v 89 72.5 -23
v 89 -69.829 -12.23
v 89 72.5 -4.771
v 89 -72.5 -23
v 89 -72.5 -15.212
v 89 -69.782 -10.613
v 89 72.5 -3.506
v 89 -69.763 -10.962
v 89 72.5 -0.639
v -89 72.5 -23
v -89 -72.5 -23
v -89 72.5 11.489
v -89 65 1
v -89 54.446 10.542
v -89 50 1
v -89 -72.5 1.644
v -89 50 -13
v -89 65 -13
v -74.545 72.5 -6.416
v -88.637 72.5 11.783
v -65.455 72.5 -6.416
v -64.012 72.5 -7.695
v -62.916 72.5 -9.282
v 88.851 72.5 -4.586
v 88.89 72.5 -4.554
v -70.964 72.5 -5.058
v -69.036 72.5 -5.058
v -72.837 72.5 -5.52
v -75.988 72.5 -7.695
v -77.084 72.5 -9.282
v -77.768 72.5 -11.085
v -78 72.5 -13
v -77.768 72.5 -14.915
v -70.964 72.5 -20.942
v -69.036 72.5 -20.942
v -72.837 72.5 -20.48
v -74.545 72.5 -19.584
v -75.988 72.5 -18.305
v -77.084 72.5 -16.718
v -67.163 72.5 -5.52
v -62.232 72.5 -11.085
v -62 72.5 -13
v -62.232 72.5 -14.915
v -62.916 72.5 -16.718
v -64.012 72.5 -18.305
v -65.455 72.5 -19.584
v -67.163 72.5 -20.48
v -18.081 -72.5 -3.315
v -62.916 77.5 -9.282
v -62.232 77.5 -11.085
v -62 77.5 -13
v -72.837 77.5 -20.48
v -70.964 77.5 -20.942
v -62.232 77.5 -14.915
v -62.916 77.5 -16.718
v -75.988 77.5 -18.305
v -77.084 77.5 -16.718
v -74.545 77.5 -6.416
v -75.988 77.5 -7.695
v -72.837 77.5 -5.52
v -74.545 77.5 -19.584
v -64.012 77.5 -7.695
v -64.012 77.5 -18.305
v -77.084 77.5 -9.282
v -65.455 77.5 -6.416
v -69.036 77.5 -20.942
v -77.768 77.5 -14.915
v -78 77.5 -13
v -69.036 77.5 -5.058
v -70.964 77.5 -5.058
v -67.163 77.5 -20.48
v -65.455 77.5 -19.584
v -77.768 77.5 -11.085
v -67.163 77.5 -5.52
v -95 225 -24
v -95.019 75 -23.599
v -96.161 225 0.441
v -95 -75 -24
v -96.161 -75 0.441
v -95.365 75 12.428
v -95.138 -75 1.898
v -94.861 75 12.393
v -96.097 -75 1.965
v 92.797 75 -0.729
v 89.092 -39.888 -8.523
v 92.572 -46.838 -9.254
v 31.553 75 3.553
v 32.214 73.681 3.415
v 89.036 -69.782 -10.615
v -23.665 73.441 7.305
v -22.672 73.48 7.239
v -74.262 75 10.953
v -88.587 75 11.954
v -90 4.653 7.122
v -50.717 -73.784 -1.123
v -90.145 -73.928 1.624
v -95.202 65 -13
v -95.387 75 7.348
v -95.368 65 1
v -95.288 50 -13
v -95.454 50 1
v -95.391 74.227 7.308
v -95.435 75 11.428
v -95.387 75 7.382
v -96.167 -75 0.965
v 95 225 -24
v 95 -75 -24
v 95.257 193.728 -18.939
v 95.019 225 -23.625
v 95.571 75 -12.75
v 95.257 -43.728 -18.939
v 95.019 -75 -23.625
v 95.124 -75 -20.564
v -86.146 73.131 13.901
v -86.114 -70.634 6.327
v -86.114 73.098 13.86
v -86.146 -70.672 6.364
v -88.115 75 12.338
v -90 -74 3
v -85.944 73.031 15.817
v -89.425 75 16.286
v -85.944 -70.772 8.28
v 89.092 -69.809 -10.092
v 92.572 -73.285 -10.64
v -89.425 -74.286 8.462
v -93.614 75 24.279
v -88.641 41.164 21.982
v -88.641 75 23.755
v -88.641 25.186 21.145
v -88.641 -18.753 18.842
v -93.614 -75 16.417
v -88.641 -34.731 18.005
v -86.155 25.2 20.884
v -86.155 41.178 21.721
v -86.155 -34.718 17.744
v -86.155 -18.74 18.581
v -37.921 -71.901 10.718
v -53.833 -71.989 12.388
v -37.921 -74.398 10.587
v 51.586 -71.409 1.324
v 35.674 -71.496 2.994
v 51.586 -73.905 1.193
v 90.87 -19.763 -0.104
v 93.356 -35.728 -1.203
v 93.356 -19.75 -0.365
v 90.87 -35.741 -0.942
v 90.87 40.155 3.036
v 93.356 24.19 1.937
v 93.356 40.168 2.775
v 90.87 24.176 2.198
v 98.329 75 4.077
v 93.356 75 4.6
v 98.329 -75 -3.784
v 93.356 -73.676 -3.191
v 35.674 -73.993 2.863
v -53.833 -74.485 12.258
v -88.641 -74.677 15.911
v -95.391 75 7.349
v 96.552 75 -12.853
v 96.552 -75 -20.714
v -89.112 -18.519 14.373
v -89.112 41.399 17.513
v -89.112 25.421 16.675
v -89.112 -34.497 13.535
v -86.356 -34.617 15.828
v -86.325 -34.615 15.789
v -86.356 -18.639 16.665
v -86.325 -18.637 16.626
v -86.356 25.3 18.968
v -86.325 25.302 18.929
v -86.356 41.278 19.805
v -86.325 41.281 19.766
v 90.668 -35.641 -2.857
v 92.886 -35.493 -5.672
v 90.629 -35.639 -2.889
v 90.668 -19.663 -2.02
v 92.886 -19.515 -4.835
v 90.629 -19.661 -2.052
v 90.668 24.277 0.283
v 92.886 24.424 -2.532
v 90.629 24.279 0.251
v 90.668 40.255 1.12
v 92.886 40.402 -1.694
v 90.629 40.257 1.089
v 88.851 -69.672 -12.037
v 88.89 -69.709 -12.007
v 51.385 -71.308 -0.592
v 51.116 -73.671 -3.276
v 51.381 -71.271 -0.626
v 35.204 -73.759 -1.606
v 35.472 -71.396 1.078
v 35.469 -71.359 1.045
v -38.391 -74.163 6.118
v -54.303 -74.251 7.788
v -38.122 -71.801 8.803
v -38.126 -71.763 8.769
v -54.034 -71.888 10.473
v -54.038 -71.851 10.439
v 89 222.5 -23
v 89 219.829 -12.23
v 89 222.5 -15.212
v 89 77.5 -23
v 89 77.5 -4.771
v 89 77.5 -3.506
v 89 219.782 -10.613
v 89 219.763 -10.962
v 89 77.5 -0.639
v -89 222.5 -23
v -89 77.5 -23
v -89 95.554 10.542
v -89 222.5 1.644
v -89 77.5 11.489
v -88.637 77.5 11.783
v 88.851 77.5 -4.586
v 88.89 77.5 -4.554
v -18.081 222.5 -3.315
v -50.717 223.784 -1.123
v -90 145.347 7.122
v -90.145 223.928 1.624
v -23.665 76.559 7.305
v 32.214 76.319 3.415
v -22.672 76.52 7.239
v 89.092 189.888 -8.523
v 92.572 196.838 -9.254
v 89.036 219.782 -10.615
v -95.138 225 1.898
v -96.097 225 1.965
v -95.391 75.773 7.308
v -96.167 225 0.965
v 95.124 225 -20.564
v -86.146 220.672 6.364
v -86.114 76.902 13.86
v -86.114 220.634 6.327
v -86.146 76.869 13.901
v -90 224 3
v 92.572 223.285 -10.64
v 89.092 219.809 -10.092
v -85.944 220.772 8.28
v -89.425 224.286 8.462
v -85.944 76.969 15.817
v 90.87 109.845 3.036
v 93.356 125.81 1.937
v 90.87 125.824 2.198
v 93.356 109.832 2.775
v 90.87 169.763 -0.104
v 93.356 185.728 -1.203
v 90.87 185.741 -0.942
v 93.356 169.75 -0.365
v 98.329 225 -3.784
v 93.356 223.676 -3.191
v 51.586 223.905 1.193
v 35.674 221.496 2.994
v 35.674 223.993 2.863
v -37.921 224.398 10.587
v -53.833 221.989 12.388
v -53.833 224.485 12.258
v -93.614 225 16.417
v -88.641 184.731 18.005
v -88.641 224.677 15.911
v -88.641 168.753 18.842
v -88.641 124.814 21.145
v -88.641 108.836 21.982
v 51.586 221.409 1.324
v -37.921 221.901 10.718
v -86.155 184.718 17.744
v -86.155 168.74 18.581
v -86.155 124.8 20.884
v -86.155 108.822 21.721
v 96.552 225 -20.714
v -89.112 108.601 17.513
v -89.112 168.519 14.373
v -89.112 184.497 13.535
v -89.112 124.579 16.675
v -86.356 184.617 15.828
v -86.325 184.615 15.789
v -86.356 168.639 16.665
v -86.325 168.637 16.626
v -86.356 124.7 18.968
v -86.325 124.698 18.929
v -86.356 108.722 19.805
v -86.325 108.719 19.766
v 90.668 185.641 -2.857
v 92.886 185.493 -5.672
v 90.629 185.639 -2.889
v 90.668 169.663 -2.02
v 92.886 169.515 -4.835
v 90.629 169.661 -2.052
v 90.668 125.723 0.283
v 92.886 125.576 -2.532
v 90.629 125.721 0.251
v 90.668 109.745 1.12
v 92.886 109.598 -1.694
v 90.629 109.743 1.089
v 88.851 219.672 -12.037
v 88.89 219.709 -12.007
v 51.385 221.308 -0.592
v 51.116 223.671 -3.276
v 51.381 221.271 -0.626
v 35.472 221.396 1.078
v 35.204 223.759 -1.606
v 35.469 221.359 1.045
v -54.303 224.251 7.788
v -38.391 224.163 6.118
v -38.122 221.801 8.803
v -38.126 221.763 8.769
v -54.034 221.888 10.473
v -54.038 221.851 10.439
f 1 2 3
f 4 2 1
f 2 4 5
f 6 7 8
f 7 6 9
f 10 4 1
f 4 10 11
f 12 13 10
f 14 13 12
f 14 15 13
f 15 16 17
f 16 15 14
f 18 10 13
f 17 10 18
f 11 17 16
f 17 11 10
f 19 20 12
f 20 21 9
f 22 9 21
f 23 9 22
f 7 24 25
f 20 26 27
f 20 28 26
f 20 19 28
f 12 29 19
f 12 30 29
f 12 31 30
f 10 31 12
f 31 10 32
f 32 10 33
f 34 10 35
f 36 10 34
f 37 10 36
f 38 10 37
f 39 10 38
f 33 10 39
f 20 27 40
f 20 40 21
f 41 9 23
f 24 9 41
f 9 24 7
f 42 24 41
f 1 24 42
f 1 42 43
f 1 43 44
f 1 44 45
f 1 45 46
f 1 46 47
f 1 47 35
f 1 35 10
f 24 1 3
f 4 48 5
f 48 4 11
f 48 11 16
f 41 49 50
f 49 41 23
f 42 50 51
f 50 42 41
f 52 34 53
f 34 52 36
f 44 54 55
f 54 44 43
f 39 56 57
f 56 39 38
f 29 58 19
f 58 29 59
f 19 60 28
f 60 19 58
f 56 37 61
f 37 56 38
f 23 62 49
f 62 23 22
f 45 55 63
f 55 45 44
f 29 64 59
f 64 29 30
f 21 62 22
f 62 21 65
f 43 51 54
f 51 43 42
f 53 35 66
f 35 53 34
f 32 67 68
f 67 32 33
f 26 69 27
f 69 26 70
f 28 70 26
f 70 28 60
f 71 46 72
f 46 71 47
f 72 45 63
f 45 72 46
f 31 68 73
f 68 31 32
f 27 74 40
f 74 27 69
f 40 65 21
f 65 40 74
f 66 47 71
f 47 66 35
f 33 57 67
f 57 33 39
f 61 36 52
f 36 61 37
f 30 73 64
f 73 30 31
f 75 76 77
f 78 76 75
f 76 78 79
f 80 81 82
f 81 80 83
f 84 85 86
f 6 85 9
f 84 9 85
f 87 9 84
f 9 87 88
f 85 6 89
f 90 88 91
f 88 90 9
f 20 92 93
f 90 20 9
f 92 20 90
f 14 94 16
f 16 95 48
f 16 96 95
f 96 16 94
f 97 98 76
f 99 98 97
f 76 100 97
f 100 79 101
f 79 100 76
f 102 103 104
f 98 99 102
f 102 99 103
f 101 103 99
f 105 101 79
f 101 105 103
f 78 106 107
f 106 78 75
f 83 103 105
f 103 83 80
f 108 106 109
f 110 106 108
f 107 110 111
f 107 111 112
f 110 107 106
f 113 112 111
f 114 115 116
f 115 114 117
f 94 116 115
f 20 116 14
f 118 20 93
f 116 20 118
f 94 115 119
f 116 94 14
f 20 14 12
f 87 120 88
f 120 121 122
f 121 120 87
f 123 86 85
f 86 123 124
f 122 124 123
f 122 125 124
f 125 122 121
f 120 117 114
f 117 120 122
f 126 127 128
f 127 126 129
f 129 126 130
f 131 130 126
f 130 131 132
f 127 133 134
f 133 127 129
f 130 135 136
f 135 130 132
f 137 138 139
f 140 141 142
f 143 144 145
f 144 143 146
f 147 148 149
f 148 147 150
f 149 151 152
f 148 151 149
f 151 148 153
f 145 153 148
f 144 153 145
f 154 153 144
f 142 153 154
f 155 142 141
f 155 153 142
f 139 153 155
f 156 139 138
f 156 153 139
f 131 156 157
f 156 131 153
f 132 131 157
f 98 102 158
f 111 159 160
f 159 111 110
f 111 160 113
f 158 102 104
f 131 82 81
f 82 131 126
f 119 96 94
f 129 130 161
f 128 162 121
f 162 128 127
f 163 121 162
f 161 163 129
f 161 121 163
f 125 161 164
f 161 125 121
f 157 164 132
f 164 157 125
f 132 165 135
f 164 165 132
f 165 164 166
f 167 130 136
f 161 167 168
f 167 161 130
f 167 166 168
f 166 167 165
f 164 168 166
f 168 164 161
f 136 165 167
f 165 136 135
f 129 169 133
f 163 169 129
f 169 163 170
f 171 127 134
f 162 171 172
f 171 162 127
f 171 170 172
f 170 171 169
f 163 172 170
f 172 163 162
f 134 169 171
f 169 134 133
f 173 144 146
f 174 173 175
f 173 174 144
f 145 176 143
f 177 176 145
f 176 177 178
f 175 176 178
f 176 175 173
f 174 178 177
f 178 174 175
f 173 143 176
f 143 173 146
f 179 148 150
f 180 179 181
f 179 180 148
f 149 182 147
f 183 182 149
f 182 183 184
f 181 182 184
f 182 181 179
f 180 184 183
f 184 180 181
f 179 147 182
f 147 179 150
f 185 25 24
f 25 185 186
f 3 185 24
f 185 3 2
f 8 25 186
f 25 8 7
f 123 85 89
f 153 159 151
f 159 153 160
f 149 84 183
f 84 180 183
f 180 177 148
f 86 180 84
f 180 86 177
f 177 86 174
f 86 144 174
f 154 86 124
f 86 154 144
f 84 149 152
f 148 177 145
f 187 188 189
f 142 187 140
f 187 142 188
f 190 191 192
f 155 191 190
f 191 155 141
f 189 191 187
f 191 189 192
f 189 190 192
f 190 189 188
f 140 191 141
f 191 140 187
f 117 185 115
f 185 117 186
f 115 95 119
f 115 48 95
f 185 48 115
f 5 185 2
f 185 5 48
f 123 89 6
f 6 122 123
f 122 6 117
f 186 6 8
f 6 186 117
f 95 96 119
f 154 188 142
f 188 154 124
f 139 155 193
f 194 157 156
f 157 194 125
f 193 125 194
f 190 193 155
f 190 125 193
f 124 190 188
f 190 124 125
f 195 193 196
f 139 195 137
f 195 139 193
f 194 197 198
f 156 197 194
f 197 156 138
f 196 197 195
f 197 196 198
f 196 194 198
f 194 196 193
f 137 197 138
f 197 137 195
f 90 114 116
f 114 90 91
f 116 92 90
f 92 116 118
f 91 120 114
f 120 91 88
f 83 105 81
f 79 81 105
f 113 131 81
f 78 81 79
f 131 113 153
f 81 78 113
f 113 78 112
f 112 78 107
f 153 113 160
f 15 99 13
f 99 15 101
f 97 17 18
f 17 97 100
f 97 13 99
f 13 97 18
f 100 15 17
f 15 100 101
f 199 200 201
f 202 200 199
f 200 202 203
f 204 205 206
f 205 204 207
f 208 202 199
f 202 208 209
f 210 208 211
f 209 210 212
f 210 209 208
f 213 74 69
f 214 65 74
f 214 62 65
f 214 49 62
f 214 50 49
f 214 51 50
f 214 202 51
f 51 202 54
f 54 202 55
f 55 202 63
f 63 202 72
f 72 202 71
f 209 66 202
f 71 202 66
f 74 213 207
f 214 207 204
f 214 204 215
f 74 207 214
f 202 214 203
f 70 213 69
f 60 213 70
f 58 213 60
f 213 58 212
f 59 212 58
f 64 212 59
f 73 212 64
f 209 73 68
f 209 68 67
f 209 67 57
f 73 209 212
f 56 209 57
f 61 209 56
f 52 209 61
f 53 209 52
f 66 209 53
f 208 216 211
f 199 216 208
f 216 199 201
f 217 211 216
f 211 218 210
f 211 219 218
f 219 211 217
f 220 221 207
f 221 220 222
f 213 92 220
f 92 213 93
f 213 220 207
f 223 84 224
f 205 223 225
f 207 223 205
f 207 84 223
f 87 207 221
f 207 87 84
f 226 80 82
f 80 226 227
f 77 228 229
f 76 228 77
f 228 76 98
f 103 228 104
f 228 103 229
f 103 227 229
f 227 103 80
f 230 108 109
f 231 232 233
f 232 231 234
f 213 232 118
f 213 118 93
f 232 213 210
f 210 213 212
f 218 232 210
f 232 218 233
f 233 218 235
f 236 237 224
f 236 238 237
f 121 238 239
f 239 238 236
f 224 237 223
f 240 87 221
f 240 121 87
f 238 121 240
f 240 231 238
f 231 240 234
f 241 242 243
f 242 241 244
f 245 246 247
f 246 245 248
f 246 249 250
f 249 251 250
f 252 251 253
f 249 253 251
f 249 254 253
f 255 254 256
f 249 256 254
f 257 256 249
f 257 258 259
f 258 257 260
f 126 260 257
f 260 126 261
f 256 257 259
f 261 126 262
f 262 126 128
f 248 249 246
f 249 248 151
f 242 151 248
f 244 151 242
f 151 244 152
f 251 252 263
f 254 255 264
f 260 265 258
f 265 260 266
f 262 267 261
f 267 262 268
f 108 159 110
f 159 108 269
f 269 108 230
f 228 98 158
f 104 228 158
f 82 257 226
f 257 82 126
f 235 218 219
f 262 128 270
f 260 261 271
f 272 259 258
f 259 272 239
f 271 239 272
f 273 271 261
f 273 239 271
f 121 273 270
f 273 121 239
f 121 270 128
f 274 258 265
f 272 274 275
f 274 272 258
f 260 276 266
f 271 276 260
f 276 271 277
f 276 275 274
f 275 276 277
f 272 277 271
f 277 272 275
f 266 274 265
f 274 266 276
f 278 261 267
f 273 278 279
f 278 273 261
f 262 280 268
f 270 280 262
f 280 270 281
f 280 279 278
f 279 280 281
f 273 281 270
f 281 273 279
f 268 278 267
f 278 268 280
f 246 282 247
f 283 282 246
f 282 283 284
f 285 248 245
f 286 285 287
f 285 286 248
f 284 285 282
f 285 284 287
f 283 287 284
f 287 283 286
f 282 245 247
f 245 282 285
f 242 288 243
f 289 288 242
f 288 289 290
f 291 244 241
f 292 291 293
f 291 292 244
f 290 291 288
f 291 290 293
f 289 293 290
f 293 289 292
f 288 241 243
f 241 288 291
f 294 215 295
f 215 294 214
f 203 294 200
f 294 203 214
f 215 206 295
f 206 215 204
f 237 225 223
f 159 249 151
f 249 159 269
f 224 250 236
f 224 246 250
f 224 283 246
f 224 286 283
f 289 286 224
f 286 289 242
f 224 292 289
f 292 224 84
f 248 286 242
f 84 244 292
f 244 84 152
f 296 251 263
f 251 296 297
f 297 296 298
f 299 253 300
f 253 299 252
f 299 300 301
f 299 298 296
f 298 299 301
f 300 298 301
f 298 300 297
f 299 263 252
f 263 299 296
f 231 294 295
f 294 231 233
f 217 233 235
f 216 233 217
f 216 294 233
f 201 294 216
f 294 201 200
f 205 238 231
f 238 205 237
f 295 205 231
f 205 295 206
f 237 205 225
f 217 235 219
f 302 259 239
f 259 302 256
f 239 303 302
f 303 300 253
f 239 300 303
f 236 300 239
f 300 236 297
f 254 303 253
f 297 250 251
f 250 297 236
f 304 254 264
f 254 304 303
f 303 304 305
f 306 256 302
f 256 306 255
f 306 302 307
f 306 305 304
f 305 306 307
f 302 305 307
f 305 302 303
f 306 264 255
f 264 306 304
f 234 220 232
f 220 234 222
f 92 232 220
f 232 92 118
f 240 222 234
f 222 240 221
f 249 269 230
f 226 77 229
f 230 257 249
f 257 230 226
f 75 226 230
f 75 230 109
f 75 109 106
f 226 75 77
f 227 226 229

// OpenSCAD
// file: mark6-keyboard-hand-holder.scad
keyPlateHolder();

module keyPlateHolder() {
	bevelEdge(153);
	translate([40,1,0])	bevelClip();
	translate([100,1,0])	bevelClip();


	translate([-2,-183,0]) mirror([0,1,0]) {
		translate([40,1,0])	bevelClip();
		translate([100,1,0])	bevelClip();

		bevelEdge(155);
	
	}
	
	translate([0,-181,0]) {
		rotate([0,0,90]) {
			bevelEdge(183);
			translate([40,1,0])	bevelClip();
			translate([130,1,0])	bevelClip();


			translate([0,-151,0]) mirror([0,1,0]) {
				bevelEdge(183);
	//			translate([40,1,0])	bevelClip();
//				translate([130,1,0])	bevelClip();

			}

		}
	
	}
}

module bevelClip(){

	translate([0,0,7.5]) {
		color("blue")	bevel(16);
	}
}

module bevelEdge(length) {
	union() {

		bevel(length);

		bevelEdgeOuterWall(length);

	}
}

module bevel(length) {
		difference() {
			union () {
			
				// Angled bottom lip and angled support
			difference () {
					color("red") {rotate([45,0,0])	cube([length, 5,5]);}
					translate([0,-2.5,5]) 	cube([length,5,5]);
				}	
				color("green") {
				translate([0,-3.5,3.5])	cube([length,5,2]);
	}
			}
			
			// cut off the outside edge of the angled support
			translate([0,1,1]) cube([length,3,5]);
		
		}
}

module bevelEdgeOuterWall(length) {
		translate([-3,0,-4]) {		
			cube([length+6,5,17]);
	
		}
}
// main file
use <mark6-keyboard-hand-holder.scad>;

wholeShell();

module wholeShell() {

difference() {
	leftHand();
			cableHole();	
}
rightHand();

}
module rightHand() {
	translate([0,150,0]) {
		mirror([0,1,0]) {
			leftHand();
		}
	}
}


module leftHand() {
	intersection() { translate([-105,-75,-125]) cube([300,150,300]);
	union() {
		difference() {
			outerShell();
			interior();
		}	
	translate([-90,-74,3]) {
		rotate([6,-3,90]) {

		keyPlateHolder();
		}
		}
	}
	}
}



module outerShell() {
	hull() {
		translate([0,0,0]) {
			rotate([4,4,0]) {
		    		cube([192,155,1], center=true);
			}
		}
		//bottom
		translate([0,0,-22]) {
			cube([190,155,4], center=true);
		}

	
	}
//translate([-95,75,-24]) cube([190,8,24]);

//translate([-95,75,-10]) cube([30,8,28]);


}
module interior() {

	cube([178,145,46],center=true);
		translate([-70,80,-13]) {
	rotate([90,0,0]) {
		cylinder(r=8, h=20,center=true);
	}
	}

}

module cableHole() {
		translate([-100,50,-13]) {
				cube([20,15,14]);
			

	}




}


module handplate() {
union() {
				cube([190,160,2], center=true);
					translate([-95,-75,-0]) {
						rotate([90,90,90]) {
							cylinder(r=5, h=190);
						}
					}
					translate([-95,75,-0]) {
						rotate([90,90,90]) {
							cylinder(r=5, h=190);
						}
					}	
					translate([90,80,-0]) {
						rotate([90,90,0]) {
							cylinder(r=5, h=160);
						}
					}
					translate([-90,80,-0]) {
						rotate([90,90,0]) {
							cylinder(r=5, h=160);
						}
					}
}
}
